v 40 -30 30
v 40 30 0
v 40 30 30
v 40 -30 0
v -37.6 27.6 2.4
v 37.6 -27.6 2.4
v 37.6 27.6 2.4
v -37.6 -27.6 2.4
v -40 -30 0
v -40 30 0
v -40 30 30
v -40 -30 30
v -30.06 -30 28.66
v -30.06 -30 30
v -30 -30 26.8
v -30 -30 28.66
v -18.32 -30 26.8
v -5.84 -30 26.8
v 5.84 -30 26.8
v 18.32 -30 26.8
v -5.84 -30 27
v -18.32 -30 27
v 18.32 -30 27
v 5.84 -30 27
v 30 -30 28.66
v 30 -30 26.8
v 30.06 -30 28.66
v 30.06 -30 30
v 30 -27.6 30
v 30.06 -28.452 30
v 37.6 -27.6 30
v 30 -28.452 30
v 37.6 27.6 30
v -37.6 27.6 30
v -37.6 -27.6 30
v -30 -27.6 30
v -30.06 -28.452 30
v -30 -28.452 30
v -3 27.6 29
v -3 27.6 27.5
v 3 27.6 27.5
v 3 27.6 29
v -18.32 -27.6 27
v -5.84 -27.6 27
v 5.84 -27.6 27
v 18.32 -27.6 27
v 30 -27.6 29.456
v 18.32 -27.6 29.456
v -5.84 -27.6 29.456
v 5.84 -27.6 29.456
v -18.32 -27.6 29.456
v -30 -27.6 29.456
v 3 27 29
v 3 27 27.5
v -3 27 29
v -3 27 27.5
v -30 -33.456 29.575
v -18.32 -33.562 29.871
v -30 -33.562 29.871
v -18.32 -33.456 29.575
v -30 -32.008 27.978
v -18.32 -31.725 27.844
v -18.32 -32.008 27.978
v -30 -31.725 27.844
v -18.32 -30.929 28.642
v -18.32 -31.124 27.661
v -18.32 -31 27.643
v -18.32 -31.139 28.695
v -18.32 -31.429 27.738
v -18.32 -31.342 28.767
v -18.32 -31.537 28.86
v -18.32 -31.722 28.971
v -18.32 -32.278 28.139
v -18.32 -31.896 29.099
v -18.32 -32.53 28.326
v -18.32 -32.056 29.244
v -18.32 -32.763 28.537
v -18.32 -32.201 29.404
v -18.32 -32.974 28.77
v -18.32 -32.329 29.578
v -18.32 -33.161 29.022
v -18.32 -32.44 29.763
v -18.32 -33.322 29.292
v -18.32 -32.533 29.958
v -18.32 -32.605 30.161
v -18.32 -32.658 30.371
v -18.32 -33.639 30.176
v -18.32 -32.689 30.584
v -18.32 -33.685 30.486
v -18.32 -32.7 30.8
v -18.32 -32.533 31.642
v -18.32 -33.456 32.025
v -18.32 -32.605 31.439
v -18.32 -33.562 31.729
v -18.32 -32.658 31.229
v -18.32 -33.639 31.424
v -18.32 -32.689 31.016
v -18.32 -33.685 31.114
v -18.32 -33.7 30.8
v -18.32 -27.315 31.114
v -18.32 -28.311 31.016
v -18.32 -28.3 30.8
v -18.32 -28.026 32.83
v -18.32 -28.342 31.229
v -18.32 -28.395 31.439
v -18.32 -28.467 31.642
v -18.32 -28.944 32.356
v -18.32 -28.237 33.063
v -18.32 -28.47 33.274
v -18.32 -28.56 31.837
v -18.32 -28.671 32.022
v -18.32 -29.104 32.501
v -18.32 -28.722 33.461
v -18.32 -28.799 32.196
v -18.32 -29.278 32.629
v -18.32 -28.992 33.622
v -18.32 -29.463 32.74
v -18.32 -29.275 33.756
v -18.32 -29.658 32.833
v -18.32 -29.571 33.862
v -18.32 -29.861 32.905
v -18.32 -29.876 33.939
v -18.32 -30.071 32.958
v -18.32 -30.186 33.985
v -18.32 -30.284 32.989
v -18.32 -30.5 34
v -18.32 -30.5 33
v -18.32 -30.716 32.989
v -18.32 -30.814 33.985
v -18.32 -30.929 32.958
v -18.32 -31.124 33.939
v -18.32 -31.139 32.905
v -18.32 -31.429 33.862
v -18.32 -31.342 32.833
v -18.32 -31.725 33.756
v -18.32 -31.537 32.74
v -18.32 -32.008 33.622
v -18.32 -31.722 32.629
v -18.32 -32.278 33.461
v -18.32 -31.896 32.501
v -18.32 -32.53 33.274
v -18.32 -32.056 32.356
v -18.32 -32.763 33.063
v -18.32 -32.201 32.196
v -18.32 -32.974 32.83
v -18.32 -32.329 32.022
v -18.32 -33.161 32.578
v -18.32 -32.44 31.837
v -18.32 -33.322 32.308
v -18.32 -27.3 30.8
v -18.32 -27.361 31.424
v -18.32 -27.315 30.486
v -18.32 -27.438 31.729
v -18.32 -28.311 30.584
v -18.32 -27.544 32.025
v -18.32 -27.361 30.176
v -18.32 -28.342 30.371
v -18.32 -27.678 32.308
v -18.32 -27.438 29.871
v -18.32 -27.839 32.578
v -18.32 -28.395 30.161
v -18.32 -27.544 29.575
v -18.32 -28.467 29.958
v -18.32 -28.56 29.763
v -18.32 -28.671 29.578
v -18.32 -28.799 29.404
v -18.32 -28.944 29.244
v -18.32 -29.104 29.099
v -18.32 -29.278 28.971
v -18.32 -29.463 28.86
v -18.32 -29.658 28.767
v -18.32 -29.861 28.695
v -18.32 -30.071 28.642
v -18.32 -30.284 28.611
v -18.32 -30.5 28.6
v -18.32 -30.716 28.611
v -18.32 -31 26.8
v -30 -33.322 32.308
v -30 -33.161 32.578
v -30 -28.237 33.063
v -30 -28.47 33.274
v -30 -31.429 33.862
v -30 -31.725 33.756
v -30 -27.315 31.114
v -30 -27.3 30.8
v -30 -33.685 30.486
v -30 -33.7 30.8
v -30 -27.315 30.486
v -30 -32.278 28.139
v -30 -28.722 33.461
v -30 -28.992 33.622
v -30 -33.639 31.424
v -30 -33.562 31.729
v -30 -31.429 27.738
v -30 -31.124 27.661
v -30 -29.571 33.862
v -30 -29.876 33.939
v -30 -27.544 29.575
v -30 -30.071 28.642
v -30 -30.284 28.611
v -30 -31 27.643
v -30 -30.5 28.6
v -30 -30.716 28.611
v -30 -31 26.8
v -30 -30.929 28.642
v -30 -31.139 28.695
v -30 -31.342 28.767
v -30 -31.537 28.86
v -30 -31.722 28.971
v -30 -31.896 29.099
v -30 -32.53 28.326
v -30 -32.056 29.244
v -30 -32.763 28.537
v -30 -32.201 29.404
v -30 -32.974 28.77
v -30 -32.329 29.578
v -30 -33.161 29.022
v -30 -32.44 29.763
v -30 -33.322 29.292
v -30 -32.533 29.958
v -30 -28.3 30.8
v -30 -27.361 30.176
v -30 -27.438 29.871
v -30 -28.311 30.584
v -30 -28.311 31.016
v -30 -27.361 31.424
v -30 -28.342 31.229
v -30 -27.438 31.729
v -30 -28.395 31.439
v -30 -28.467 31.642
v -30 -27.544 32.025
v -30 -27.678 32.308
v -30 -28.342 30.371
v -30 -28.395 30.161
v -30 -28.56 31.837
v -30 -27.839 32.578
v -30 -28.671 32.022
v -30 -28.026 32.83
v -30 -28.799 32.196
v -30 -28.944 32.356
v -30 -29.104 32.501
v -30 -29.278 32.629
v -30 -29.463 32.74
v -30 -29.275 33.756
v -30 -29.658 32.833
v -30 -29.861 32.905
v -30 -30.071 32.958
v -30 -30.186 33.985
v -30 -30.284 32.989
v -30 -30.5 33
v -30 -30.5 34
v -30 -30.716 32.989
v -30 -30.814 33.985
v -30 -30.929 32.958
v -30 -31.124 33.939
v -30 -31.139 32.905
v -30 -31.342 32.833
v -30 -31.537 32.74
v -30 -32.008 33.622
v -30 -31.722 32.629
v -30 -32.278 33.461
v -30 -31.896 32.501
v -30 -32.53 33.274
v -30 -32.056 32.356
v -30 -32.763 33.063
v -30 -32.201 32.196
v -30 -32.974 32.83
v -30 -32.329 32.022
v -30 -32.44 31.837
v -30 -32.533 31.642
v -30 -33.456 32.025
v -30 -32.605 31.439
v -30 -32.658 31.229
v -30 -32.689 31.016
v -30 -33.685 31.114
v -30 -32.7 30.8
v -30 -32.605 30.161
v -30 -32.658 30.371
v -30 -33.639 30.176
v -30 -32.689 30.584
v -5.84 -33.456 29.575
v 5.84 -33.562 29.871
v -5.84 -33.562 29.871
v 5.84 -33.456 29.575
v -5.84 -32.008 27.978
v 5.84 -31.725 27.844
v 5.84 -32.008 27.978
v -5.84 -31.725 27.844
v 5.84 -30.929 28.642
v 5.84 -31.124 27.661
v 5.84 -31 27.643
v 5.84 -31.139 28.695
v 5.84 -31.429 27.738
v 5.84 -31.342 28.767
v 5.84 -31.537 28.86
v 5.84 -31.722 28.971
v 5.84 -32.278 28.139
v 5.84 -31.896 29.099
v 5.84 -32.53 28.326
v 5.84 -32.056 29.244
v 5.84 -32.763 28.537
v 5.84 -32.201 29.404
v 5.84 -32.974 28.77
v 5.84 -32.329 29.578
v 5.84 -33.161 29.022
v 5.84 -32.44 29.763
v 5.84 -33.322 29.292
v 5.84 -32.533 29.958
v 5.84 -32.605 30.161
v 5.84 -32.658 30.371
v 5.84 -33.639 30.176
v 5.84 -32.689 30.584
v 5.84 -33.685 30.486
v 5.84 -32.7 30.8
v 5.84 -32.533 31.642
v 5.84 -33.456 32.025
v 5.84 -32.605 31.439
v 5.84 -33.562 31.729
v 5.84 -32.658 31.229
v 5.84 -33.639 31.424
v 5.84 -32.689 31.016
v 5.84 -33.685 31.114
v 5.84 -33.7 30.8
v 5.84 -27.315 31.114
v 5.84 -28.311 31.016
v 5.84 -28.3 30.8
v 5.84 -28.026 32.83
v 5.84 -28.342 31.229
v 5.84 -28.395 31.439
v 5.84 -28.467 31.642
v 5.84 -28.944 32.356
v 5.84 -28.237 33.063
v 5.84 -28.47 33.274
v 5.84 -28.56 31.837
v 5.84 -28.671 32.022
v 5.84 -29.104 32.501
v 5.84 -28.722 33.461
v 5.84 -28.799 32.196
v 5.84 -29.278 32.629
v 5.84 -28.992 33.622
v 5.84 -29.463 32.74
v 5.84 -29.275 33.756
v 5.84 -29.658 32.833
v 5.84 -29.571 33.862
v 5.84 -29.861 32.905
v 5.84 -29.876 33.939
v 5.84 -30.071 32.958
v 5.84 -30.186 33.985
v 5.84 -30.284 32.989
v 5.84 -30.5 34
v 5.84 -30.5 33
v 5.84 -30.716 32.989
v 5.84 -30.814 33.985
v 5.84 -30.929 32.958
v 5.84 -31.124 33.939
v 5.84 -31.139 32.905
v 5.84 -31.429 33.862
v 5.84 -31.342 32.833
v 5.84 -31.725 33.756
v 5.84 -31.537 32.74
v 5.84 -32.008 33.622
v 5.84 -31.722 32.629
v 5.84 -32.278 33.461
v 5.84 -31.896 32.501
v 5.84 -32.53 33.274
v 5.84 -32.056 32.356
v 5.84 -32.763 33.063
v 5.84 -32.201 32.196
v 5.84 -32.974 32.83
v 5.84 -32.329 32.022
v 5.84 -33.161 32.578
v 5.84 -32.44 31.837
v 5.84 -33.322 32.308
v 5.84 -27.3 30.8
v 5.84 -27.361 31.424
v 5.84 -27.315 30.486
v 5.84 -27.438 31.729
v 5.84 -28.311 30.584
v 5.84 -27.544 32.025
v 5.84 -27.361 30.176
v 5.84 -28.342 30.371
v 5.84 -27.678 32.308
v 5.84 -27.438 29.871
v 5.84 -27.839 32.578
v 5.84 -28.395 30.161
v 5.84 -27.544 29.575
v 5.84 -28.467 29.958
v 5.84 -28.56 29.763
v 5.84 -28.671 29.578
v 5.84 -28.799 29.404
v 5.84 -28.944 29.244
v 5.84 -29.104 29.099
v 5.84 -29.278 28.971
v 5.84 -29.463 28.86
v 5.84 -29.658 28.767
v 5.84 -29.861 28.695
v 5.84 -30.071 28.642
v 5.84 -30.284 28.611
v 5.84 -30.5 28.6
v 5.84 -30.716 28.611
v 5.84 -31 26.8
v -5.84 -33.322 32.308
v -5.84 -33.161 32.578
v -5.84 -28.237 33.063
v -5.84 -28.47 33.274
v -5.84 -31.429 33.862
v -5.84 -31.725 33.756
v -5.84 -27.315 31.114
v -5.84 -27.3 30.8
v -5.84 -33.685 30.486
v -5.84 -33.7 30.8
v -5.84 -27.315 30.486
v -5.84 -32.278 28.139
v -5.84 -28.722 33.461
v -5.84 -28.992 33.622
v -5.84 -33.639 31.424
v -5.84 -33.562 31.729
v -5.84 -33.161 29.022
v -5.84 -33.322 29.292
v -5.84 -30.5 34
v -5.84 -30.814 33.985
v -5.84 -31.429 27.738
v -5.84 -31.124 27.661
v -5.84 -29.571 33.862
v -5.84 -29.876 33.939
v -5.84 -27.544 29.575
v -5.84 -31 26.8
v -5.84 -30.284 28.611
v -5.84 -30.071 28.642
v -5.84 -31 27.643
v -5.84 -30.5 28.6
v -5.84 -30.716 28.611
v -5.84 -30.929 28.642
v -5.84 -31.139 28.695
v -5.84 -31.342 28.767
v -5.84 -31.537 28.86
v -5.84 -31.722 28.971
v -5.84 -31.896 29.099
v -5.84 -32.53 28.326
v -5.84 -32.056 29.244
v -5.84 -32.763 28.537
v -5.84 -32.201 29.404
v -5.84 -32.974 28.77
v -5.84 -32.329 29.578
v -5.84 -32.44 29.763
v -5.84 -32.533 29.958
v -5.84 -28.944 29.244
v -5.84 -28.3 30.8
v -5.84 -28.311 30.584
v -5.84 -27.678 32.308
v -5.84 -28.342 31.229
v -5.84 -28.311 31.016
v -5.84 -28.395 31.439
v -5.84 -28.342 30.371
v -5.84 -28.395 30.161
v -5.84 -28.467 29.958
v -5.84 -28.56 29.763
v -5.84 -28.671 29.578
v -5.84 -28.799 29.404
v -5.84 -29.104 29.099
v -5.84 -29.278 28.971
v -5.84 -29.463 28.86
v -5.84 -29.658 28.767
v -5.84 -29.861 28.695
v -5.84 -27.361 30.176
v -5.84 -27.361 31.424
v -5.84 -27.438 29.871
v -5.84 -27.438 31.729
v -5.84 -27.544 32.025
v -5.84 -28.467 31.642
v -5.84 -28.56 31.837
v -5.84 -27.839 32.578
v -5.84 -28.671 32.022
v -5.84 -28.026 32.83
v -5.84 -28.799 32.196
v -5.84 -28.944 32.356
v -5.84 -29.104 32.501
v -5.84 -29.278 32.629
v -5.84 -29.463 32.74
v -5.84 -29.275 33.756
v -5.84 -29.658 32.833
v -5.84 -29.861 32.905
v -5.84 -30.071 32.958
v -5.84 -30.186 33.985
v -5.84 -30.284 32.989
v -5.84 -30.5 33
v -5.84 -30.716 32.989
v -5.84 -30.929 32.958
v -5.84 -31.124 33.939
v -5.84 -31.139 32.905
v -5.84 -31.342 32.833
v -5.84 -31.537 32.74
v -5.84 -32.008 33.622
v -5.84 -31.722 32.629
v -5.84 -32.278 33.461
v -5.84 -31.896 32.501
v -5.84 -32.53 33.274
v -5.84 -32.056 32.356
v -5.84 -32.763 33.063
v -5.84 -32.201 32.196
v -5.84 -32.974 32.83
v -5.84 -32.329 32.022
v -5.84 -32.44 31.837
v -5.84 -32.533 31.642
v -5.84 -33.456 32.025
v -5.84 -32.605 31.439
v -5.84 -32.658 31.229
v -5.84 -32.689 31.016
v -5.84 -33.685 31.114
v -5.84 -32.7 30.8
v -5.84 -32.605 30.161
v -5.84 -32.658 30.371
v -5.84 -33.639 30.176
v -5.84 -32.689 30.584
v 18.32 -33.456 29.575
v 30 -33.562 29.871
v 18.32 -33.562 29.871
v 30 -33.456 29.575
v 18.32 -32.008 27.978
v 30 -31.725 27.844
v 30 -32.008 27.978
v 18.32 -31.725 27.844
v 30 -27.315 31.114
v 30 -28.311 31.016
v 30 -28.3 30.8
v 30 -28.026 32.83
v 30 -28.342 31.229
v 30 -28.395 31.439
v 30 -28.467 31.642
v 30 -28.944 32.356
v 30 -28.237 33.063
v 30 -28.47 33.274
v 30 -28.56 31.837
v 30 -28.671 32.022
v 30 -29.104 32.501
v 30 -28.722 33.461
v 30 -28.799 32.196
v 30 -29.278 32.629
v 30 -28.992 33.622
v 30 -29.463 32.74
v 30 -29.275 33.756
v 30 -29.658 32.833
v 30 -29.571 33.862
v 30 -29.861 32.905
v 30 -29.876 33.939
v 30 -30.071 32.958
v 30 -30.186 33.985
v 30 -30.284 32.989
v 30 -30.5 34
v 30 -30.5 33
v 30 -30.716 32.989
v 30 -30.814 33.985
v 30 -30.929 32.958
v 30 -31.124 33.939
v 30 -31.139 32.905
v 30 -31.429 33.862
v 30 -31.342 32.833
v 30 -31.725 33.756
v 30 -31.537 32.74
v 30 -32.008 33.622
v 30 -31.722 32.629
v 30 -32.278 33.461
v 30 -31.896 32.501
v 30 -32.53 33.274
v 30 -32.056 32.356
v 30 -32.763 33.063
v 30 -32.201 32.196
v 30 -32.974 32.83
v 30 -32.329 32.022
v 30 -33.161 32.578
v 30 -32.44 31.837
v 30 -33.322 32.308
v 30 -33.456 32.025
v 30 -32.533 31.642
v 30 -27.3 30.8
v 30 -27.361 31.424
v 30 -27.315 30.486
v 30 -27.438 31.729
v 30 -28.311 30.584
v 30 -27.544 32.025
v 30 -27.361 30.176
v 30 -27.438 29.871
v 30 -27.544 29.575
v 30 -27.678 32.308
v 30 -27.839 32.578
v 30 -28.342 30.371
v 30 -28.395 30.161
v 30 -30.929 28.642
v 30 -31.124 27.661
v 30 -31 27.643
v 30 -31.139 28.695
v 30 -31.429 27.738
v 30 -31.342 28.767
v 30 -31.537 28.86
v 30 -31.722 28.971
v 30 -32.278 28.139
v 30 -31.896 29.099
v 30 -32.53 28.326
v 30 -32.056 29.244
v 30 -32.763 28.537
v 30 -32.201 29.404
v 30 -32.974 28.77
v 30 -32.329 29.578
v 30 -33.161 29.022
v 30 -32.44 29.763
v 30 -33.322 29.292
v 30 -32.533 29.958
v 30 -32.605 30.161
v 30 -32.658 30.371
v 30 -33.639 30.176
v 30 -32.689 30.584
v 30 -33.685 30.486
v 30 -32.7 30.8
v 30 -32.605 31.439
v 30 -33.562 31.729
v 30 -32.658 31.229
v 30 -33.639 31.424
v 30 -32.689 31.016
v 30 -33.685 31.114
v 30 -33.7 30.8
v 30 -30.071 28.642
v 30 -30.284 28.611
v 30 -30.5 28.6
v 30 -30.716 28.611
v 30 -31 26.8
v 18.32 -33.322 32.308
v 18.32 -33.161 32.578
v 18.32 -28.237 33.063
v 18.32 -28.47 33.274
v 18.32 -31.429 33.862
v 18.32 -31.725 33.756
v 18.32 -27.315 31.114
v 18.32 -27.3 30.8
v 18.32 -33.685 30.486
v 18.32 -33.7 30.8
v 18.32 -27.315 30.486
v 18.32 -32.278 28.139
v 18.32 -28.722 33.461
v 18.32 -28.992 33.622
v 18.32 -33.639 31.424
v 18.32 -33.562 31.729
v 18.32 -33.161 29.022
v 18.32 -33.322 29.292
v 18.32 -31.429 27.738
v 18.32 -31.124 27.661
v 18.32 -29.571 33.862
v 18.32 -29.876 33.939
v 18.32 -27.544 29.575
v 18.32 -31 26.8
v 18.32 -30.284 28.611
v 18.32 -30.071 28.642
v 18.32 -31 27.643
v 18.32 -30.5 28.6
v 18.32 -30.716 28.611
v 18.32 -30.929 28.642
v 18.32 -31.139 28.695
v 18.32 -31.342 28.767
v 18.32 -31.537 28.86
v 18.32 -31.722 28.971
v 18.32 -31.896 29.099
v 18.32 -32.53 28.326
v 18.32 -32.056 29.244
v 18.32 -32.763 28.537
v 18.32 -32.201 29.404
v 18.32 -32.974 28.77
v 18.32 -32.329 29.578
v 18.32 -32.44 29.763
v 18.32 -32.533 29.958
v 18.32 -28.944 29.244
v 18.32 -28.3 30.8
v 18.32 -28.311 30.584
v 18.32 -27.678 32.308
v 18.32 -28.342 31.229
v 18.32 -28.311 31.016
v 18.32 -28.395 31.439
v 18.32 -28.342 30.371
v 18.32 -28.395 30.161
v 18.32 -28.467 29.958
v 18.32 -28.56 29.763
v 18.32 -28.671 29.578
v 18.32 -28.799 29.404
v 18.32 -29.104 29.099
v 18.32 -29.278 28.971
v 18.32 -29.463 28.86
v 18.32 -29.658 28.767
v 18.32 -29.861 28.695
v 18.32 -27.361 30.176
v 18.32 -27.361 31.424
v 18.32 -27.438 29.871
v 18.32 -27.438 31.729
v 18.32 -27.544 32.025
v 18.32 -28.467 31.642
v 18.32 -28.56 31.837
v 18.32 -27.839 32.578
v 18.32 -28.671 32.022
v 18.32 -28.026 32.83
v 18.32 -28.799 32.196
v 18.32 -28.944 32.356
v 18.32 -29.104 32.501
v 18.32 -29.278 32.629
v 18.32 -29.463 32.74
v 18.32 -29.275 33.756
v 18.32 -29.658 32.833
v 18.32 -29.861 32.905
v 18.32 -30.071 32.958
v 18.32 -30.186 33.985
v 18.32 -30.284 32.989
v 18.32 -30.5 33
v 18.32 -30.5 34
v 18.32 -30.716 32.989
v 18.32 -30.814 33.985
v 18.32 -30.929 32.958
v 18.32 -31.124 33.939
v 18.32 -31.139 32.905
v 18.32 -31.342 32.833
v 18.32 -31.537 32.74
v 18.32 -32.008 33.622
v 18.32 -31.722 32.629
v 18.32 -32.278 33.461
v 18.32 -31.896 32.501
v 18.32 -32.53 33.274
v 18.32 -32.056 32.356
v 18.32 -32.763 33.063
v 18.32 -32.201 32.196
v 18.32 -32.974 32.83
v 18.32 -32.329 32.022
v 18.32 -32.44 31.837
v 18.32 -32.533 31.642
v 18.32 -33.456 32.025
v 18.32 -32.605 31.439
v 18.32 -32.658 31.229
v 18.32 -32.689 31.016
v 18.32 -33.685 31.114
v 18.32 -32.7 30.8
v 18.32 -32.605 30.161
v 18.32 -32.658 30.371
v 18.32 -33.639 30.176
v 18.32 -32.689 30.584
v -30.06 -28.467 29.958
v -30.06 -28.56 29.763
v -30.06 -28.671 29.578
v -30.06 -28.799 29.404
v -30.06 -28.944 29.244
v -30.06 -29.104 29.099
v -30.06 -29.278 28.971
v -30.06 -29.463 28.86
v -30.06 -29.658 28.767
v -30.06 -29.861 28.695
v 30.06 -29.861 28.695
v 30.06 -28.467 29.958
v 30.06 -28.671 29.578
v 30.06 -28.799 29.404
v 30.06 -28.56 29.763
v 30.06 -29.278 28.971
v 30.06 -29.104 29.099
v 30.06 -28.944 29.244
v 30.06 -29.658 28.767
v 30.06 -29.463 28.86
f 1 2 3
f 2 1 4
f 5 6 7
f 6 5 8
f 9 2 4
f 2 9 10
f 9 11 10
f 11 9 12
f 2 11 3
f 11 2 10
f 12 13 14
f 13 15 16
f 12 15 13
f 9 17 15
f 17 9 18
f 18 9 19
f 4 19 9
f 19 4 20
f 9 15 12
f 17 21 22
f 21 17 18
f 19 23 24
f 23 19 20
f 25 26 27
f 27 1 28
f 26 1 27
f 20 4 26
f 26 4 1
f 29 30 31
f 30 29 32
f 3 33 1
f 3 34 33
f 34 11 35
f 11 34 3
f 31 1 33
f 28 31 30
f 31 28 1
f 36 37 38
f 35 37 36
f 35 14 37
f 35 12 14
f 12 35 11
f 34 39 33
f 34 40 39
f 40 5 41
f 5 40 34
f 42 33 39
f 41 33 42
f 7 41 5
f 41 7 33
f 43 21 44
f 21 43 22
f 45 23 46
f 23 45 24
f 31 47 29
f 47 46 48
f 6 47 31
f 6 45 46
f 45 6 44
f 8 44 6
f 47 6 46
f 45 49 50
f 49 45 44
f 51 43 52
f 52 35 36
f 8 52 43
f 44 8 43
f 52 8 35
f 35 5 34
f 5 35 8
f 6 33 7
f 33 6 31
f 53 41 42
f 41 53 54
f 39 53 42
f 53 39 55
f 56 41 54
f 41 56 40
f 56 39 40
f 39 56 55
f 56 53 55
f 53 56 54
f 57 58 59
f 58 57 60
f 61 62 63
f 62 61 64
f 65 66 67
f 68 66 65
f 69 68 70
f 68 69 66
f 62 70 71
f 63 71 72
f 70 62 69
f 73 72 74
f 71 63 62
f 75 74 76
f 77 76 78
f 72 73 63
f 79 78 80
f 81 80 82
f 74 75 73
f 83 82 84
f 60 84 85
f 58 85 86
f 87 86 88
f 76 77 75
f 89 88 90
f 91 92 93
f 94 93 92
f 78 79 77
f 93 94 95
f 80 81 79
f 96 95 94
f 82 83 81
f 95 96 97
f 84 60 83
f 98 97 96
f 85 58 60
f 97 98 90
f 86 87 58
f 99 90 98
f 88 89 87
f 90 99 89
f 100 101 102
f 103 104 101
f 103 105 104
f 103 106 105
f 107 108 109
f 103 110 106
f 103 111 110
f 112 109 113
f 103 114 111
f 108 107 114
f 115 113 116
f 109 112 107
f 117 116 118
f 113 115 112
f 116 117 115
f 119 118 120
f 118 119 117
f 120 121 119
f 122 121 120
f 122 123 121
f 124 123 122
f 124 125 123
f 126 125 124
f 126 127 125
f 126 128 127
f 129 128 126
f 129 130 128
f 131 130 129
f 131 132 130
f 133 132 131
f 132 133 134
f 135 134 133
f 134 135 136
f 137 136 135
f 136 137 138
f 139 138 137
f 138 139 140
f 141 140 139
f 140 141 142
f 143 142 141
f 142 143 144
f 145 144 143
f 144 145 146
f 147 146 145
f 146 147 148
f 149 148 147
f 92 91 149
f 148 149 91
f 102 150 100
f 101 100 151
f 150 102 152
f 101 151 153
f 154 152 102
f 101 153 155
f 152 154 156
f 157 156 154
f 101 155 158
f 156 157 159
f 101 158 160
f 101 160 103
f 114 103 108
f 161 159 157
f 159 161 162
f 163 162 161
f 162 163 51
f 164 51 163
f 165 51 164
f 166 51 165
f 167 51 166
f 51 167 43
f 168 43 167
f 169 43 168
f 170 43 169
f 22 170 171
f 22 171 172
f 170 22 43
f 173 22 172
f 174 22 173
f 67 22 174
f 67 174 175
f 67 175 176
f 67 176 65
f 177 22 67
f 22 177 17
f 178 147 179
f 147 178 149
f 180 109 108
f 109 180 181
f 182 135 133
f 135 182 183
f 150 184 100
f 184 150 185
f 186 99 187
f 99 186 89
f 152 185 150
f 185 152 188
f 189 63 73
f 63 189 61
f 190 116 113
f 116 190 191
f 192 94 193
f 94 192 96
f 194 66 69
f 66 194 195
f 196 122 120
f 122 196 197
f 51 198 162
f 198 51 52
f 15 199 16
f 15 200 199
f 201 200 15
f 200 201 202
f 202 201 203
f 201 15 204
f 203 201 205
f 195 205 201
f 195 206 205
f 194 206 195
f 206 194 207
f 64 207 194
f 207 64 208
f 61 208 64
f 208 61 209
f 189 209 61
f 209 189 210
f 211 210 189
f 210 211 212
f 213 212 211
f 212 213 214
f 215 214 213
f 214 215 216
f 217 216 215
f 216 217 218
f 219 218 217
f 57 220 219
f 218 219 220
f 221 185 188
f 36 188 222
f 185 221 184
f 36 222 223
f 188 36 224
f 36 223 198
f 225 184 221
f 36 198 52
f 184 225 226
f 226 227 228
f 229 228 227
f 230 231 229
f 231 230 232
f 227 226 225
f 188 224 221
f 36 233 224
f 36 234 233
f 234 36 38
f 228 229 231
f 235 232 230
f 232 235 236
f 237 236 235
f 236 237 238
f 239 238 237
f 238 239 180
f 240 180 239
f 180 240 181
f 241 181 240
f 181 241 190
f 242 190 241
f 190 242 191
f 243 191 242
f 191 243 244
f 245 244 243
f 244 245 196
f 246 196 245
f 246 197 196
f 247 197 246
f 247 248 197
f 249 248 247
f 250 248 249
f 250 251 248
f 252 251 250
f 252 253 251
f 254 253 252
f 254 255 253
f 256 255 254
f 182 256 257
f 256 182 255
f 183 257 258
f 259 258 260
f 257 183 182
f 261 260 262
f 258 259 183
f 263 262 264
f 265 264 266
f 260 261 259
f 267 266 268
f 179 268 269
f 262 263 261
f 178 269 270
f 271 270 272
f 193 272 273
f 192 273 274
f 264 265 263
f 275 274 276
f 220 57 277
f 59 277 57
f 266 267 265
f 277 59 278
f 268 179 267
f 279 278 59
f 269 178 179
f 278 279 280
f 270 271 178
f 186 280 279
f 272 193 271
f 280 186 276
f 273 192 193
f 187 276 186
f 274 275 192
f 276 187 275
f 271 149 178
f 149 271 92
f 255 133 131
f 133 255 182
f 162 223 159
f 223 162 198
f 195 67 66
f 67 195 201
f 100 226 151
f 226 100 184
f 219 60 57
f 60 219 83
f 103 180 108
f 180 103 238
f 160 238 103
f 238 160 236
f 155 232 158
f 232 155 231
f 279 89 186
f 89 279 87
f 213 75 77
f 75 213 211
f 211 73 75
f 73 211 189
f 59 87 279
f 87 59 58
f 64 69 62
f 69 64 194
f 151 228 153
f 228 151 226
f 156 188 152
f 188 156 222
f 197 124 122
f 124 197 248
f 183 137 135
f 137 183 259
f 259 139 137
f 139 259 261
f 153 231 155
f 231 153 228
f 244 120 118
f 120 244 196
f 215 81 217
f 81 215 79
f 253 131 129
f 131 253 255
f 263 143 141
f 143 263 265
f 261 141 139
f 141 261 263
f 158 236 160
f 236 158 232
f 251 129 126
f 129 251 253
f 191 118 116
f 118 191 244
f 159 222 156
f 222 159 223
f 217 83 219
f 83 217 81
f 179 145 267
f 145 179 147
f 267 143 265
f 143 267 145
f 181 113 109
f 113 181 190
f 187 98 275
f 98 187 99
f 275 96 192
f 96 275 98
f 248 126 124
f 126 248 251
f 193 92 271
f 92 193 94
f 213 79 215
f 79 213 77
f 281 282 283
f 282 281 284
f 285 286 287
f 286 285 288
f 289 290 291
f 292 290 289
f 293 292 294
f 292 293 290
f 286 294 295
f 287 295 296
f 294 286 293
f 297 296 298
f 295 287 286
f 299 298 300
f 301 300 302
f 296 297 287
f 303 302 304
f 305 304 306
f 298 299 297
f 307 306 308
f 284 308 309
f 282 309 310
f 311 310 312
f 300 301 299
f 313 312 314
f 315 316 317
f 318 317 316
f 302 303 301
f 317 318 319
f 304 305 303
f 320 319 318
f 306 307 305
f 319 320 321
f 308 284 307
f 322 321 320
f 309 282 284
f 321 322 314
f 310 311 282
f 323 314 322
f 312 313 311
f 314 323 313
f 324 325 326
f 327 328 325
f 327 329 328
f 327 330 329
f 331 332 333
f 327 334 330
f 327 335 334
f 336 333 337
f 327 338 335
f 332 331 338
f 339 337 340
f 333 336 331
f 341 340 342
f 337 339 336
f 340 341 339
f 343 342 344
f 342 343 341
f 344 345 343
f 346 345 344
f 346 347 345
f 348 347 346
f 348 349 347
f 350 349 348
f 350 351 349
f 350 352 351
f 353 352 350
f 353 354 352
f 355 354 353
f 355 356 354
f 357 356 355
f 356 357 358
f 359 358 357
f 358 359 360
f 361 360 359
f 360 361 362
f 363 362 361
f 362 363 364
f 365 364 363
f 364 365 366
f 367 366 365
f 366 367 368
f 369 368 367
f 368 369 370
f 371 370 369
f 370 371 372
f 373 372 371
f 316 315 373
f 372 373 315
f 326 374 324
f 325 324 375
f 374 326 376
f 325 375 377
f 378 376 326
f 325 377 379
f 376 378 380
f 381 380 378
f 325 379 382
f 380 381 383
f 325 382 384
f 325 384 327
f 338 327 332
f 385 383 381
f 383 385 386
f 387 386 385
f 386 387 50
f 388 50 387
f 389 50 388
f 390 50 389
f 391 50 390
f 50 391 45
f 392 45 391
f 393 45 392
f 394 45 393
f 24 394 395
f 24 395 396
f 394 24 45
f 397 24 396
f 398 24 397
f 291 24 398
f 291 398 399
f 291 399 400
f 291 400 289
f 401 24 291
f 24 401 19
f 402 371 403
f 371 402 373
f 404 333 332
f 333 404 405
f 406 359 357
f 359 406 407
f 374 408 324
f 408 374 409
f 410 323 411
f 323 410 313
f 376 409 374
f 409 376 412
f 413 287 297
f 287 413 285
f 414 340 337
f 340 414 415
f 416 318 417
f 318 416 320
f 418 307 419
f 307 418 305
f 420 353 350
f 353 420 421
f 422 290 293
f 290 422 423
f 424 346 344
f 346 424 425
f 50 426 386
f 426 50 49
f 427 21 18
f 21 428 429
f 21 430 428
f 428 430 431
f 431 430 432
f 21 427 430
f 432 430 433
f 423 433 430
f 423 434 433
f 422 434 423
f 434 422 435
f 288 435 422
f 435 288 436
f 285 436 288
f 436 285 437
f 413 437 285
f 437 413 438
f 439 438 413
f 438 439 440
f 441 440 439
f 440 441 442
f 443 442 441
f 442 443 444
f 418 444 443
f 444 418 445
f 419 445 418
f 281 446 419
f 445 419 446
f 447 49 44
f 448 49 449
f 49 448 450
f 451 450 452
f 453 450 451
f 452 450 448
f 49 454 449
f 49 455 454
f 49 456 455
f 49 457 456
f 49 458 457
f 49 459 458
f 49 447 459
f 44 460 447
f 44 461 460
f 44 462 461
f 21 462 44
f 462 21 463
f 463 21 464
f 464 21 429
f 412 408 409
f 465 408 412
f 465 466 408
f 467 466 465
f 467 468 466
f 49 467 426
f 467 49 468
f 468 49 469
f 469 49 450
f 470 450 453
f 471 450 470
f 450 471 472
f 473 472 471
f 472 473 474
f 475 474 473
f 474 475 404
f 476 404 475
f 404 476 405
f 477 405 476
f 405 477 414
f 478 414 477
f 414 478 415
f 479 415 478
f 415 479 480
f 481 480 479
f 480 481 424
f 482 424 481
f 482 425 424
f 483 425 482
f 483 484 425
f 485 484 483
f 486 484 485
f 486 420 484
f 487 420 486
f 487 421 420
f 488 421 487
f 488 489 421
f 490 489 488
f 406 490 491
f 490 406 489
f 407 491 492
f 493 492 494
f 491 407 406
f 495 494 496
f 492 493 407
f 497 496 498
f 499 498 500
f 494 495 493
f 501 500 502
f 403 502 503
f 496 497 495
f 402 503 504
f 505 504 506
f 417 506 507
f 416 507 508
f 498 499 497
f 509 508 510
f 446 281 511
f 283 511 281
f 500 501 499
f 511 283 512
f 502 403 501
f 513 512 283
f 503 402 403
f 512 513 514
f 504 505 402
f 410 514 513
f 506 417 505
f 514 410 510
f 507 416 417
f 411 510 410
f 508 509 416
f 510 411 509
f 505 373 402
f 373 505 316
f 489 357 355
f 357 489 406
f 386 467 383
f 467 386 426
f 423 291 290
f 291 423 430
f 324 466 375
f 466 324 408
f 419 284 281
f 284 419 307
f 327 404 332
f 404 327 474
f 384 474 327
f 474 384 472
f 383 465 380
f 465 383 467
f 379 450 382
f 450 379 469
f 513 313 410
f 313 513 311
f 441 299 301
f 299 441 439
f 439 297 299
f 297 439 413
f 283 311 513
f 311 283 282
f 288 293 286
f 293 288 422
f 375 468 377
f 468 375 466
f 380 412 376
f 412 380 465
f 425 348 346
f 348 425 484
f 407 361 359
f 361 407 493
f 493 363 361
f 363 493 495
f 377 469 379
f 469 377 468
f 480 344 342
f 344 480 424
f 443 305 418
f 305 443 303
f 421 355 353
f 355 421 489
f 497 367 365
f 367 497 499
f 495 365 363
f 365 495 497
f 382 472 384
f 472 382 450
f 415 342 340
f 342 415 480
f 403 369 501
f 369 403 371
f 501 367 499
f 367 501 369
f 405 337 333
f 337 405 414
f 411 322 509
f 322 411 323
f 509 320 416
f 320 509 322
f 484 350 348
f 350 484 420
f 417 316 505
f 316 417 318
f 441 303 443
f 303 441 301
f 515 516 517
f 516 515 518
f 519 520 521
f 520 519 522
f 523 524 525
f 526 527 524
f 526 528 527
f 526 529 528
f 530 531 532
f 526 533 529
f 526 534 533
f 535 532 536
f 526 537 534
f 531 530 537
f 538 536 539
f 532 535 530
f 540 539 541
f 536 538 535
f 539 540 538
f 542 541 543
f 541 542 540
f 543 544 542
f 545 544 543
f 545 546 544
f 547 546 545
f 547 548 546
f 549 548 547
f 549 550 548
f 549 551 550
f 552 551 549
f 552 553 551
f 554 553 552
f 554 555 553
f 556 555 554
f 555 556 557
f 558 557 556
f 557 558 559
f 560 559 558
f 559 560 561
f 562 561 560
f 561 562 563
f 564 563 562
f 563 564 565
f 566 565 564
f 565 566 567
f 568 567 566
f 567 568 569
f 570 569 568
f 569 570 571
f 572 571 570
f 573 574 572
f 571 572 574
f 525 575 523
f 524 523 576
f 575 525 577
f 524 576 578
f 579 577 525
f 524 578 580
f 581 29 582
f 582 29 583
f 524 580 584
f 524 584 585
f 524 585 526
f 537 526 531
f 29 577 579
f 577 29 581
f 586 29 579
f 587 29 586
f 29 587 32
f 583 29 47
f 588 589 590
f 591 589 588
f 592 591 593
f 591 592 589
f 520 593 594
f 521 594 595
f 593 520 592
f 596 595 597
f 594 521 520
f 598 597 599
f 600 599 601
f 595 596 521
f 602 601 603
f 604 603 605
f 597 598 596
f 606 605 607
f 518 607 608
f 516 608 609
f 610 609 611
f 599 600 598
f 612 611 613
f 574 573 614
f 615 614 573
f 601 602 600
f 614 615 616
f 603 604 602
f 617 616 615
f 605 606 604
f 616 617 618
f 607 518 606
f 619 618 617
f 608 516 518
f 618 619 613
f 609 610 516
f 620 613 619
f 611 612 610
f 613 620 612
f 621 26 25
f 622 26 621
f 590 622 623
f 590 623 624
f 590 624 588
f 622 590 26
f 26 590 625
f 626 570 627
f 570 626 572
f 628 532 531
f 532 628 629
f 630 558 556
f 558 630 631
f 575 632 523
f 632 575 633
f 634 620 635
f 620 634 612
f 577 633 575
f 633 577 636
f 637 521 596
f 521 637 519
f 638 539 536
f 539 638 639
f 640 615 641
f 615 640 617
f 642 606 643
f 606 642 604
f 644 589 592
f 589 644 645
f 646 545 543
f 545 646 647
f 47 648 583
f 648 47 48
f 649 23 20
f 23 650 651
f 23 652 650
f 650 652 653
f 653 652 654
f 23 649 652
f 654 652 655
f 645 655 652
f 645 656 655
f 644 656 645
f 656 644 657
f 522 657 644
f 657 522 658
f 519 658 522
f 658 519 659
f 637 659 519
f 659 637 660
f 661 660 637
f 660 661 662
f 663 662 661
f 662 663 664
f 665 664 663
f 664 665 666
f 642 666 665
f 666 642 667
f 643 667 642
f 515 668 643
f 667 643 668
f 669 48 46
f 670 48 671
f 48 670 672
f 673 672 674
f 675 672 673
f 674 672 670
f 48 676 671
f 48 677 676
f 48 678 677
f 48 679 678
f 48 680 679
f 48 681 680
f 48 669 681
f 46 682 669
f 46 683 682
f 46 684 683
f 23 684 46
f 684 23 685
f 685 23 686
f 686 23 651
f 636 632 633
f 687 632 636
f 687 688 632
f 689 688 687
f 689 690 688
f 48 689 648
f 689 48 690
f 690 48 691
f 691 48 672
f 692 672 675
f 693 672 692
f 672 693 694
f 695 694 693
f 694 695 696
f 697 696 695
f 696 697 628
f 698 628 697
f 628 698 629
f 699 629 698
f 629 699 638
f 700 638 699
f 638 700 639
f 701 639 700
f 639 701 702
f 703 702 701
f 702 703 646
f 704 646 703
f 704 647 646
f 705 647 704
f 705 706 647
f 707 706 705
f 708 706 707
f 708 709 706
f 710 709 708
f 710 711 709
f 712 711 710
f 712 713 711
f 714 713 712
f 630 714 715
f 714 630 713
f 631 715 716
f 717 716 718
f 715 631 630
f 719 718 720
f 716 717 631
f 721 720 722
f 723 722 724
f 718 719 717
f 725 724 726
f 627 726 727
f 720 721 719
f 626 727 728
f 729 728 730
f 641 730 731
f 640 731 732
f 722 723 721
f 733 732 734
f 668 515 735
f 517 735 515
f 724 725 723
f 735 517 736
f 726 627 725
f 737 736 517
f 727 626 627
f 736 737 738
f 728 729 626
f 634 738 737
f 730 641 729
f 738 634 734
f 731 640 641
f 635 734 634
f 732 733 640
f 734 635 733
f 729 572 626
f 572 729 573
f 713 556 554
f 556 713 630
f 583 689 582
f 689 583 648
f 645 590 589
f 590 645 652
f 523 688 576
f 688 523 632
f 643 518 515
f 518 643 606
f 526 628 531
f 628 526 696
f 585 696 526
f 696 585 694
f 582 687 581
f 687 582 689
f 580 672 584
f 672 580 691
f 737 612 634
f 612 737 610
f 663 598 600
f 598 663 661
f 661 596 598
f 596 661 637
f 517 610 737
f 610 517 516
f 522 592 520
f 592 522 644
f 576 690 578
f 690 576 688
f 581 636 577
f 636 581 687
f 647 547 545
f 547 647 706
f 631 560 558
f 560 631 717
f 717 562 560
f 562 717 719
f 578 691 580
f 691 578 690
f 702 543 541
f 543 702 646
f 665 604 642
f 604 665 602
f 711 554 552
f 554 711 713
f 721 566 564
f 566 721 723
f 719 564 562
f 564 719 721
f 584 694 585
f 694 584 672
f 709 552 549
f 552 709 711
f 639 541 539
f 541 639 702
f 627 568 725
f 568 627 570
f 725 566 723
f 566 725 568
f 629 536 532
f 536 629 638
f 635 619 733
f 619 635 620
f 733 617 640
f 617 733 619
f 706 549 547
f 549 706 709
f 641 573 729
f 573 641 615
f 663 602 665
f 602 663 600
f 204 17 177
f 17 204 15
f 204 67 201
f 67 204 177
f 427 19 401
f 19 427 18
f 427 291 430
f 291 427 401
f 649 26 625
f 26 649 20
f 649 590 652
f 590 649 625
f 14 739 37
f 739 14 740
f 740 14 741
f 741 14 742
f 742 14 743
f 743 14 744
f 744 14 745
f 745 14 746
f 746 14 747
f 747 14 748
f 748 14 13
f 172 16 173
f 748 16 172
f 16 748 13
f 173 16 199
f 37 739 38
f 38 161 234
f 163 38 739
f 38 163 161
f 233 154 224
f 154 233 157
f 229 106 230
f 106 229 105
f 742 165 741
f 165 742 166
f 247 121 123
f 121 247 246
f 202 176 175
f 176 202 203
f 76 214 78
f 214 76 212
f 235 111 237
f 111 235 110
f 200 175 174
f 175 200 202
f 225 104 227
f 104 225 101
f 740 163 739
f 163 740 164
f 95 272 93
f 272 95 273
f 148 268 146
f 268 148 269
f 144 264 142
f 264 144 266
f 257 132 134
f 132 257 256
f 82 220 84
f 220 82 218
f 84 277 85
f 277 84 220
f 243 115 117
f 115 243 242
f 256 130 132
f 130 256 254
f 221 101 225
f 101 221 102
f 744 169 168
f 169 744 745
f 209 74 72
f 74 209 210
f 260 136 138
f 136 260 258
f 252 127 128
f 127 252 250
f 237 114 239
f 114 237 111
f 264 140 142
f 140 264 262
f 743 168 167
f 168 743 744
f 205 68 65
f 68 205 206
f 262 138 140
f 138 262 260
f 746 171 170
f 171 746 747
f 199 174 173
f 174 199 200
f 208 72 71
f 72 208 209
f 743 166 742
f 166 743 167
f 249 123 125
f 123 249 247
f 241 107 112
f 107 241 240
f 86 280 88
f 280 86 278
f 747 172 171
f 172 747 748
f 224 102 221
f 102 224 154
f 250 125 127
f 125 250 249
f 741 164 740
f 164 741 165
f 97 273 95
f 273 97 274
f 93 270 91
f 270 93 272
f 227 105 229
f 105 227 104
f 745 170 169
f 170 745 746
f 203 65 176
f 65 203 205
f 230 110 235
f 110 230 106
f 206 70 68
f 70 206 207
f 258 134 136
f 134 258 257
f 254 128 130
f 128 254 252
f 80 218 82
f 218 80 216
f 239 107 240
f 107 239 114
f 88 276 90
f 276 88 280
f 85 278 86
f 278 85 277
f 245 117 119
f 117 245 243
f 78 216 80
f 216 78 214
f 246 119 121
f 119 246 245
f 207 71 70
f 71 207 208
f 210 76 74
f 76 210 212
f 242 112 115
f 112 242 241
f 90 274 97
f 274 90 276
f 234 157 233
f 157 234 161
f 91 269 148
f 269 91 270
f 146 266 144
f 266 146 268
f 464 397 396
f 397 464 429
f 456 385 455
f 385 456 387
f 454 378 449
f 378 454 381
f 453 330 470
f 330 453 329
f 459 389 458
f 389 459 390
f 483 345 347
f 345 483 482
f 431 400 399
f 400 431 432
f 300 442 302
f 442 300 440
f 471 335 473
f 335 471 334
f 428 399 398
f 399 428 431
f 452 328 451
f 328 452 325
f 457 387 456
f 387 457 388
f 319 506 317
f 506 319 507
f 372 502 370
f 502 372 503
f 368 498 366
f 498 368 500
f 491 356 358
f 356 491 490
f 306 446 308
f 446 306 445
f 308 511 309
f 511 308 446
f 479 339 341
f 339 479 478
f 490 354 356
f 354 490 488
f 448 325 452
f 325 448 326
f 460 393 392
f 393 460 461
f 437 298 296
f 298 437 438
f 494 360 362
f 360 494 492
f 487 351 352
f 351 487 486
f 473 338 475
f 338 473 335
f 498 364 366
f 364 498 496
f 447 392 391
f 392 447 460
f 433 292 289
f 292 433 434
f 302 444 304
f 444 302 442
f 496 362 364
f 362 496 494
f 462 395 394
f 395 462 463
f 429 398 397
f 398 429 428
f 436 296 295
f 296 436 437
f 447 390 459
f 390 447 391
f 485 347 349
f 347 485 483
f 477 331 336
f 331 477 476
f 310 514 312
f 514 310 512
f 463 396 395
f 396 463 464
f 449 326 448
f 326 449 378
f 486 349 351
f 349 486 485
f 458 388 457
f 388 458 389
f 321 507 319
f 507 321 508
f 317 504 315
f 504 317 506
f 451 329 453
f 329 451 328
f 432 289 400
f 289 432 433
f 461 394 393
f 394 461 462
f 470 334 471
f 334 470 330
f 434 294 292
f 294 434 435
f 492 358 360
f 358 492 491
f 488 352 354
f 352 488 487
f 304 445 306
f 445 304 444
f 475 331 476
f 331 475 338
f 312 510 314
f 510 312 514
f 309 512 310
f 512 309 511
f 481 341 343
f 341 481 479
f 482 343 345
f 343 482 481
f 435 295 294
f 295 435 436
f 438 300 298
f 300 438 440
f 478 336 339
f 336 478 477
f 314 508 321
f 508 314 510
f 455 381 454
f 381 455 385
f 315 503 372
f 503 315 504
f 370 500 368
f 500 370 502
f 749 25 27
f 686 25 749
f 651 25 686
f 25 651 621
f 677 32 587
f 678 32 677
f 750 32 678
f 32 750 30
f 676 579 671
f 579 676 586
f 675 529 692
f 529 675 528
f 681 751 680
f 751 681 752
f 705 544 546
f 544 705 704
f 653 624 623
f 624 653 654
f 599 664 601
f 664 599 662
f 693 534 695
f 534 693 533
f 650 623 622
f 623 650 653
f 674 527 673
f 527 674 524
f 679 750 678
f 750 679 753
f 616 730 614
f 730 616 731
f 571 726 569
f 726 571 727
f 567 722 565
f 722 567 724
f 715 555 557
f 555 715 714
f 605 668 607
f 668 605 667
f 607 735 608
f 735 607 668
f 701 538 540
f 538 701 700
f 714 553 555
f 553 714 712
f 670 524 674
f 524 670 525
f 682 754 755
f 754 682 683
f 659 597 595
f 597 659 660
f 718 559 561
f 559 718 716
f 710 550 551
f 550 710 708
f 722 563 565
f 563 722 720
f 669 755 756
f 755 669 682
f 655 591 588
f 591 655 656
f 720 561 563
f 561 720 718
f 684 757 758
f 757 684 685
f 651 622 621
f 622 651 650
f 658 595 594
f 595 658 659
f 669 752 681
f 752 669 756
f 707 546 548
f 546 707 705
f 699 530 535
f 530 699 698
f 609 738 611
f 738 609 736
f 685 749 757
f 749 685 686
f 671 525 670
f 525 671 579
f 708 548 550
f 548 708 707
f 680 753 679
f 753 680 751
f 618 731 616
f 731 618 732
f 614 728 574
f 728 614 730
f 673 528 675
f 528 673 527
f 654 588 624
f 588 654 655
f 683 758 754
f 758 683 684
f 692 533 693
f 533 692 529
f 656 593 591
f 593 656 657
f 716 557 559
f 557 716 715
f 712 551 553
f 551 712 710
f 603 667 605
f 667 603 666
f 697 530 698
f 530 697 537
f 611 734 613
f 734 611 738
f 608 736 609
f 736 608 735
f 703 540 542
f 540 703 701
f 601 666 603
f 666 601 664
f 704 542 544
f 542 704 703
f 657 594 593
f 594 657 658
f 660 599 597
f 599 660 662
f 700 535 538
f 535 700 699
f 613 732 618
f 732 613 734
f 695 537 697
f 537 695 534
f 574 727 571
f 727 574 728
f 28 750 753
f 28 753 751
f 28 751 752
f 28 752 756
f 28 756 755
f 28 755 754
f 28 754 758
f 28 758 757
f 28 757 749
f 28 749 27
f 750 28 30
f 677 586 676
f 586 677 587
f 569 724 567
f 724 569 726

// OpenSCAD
// Box with print-in-place hinge (v3: global bore subtraction, hinge cutouts)
part = "box";
cadverify_only = "";
module instance(name, part, unit = 1) {
    echo(cadverify_instance = [name, part, unit]);
    if (cadverify_only == "" || cadverify_only == name) children();
}

Rkn = 3.2; rbore = 2.2; rpin = 1.9;
yh = -30.5; zh = 30.8;
lid_zh = 3.4;
lid_lift = 27.4;
pin_lift_z = 27.8; pin_shift_y = -30.5;
k0x0=-30; k0x1=-18.32;
k1x0=-17.92; k1x1=-6.24;
k2x0=-5.84; k2x1=5.84;
k3x0=6.24; k3x1=17.92;
k4x0=18.32; k4x1=30;

$fn = 64;

module xcyl(x0, x1, r, y, z) {
    translate([x0, y, z]) rotate([0, 90, 0]) cylinder(r = r, h = x1 - x0);
}

module box_part() {
    difference() {
        union() {
            translate([-40, -30, 0]) cube([80, 60, 2.4]);
            translate([-40, 27.6, 2.4]) cube([80, 2.4, 27.6]);
            translate([-40, -30, 2.4]) cube([80, 2.4, 24.6]);
            translate([-40, -30, 27.0]) cube([11, 2.4, 3.0]);
            translate([29, -30, 27.0]) cube([11, 2.4, 3.0]);
            translate([-40, -27.6, 2.4]) cube([2.4, 55.2, 27.6]);
            translate([37.6, -27.6, 2.4]) cube([2.4, 55.2, 27.6]);
            translate([-3, 27.0, 27.5]) cube([6, 0.6, 1.5]);
            xcyl(k0x0, k0x1, Rkn, yh, zh);
            xcyl(k2x0, k2x1, Rkn, yh, zh);
            xcyl(k4x0, k4x1, Rkn, yh, zh);
            translate([k0x0, -31, 26.8]) cube([k0x1-k0x0, 3.4, 4.0]);
            translate([k2x0, -31, 26.8]) cube([k2x1-k2x0, 3.4, 4.0]);
            translate([k4x0, -31, 26.8]) cube([k4x1-k4x0, 3.4, 4.0]);
        }
        xcyl(k0x0-0.06, k0x1+0.06, rbore, yh, zh);
        xcyl(k2x0-0.06, k2x1+0.06, rbore, yh, zh);
        xcyl(k4x0-0.06, k4x1+0.06, rbore, yh, zh);
    }
}

module lid_part() {
    difference() {
        union() {
            translate([-40, -30, 10.6]) cube([80, 60, 2.4]);
            translate([-40, 27.6, 3]) cube([80, 2.4, 7.6]);
            translate([k1x0, -30, 3]) cube([k1x1-k1x0, 2.4, 7.6]);
            translate([k3x0, -30, 3]) cube([k3x1-k3x0, 2.4, 7.6]);
            translate([-40, -30, 3]) cube([11, 2.4, 7.6]);
            translate([29, -30, 3]) cube([11, 2.4, 7.6]);
            translate([-40, -27.6, 3]) cube([2.4, 55.2, 7.6]);
            translate([37.6, -27.6, 3]) cube([2.4, 55.2, 7.6]);
            translate([-37.2, 25.2, 0]) cube([74.4, 2.0, 10.6]);
            translate([-37.2, -27.2, 0]) cube([74.4, 2.0, 10.6]);
            translate([-37.2, -25.2, 0]) cube([2.0, 50.4, 10.6]);
            translate([35.2, -25.2, 0]) cube([2.0, 50.4, 10.6]);
            xcyl(k1x0, k1x1, Rkn, yh, lid_zh);
            xcyl(k3x0, k3x1, Rkn, yh, lid_zh);
            translate([k1x0, -31, 0]) cube([k1x1-k1x0, 3.4, 5]);
            translate([k3x0, -31, 0]) cube([k3x1-k3x0, 3.4, 5]);
        }
        xcyl(k1x0-0.06, k1x1+0.06, rbore, yh, lid_zh);
        xcyl(k3x0-0.06, k3x1+0.06, rbore, yh, lid_zh);
        translate([-3.3, 26.3, -0.05]) cube([6.6, 1.5, 2.05]);
    }
}

module pin_part() {
    union() {
        xcyl(-32.4, 32.4, rpin, 0, 3);
        xcyl(30.4, 32.4, 3, 0, 3);
        xcyl(-32.4, -30.4, 3, 0, 3);
    }
}

if (part == "box") {
    echo(cadverify_spec = [
        ["bounds", [[-40, -33.7, 0], [40, 30, 34.0]]],
        ["bodies", 1],
        ["through_holes", 3],
        ["support_faces", [["bed", "-z", 4000]]],
        ["overhangs_allowed", [["hinge knuckles, bores and wall cutouts print in place", [[-30.2, -33.9, 26.5], [30.2, -27.1, 33.5]]]]],
        ["copies", 1],
        ["details", [
            ["floor", "thickness", [0, 0, -1], [0, 0, 1], 2.4],
            ["front_wall", "thickness", [0, 31, 15], [0, -1, 0], 2.4],
            ["cavity", "void", [[-37.6, -27.6, 2.4], [37.6, 27.6, 29.9]], 0.9],
            ["hinge_bore", "hole", [-31, -30.5, 30.8], [1, 0, 0], [[0, 4.4], [11.6, 4.4]]],
            ["catch_bump", "material", [[-3, 27.0, 27.5], [3, 27.6, 29.0]], 0.9],
            ["hinge_view", "view", [[-30, -34, 26.5], [30, -27, 34.5]]]
        ]]
    ]);
    box_part();
} else if (part == "lid") {
    echo(cadverify_spec = [
        ["bounds", [[-40, -33.7, 0], [40, 30, 13]]],
        ["bodies", 1],
        ["through_holes", 2],
        ["support_faces", [["bed", "-z", 300]]],
        ["overhangs_allowed", [
            ["hinge knuckles and bores print in place", [[-18.2, -33.9, 0], [18.2, -27.1, 4.2]]],
            ["skirt cutout top bridges", [[-30.2, -30.2, 6.5], [30.2, -27.4, 7.5]]],
            ["lid top bridging over plug cavity", [[-37.2, -24.9, 10.1], [37.2, 25.2, 11.1]]]
        ]],
        ["copies", 1],
        ["details", [
            ["top", "thickness", [0, 0, 14], [0, 0, -1], 2.4],
            ["skirt", "thickness", [0, 31, 6], [0, -1, 0], 2.4],
            ["plug_cavity", "void", [[-35.2, -24.9, 0], [35.2, 25.2, 10.5]], 0.9],
            ["hinge_bore", "hole", [-18.6, -30.5, 3.4], [1, 0, 0], [[0, 4.4], [11.6, 4.4]]],
            ["catch_notch", "void", [[-3.3, 26.3, 0], [3.3, 27.8, 2.0]], 0.9],
            ["catch_view", "view", [[-5, 26, 0], [5, 28.5, 3]]]
        ]]
    ]);
    lid_part();
} else if (part == "pin") {
    echo(cadverify_spec = [
        ["bounds", [[-32.4, -3, 0], [32.4, 3, 6]]],
        ["bodies", 1],
        ["support_faces", []],
        ["overhangs_allowed", [["pin shaft underside bridges with 0.3 gap", [[-32.4, -1.9, 0], [32.4, 1.9, 1.6]]]]],
        ["copies", 1],
        ["details", [
            ["shaft", "thickness", [0, 3, 3], [0, -1, 0], 3.8],
            ["head", "material", [[30.4, -3, 0], [32.4, 3, 6]], 0.7],
            ["pin_view", "view", [[-32.4, -3, 0], [32.4, 3, 6]]]
        ]]
    ]);
    pin_part();
} else if (part == "assembly") {
    echo(cadverify_spec = [
        ["bounds", [[-40, -33.7, 0], [40, 30, 40.4]]],
        ["support_faces", [["bed", "-z", 4000]]],
        ["allowed_interferences", []],
        ["motions", [
            ["lid_open", ["lid"], "rotate", [0, -30.5, 30.8], [1, 0, 0], [0, 110], ["flex", [["lid", "box", 0.5, "catch bump clearance pass"]]]]
        ]],
        ["assembly_order", [
            [["box"], [0, 0, 0]],
            [["lid"], [0, 0, -1]],
            [["pin"], [1, 0, 0]]
        ]],
        ["print_in_place", 0.3],
        ["overhangs_allowed", [
            ["hinge undersides, pin bridge and cutouts in place", [[-33, -34, 26.5], [33, -27, 34.8]]],
            ["lid top bridging over box cavity", [[-37.2, -24.9, 37.5], [37.2, 25.2, 38.5]]]
        ]]
    ]);
    instance("box", "box") box_part();
    instance("lid", "lid") translate([0, 0, lid_lift]) lid_part();
    instance("pin", "pin") translate([0, pin_shift_y, pin_lift_z]) pin_part();
}
